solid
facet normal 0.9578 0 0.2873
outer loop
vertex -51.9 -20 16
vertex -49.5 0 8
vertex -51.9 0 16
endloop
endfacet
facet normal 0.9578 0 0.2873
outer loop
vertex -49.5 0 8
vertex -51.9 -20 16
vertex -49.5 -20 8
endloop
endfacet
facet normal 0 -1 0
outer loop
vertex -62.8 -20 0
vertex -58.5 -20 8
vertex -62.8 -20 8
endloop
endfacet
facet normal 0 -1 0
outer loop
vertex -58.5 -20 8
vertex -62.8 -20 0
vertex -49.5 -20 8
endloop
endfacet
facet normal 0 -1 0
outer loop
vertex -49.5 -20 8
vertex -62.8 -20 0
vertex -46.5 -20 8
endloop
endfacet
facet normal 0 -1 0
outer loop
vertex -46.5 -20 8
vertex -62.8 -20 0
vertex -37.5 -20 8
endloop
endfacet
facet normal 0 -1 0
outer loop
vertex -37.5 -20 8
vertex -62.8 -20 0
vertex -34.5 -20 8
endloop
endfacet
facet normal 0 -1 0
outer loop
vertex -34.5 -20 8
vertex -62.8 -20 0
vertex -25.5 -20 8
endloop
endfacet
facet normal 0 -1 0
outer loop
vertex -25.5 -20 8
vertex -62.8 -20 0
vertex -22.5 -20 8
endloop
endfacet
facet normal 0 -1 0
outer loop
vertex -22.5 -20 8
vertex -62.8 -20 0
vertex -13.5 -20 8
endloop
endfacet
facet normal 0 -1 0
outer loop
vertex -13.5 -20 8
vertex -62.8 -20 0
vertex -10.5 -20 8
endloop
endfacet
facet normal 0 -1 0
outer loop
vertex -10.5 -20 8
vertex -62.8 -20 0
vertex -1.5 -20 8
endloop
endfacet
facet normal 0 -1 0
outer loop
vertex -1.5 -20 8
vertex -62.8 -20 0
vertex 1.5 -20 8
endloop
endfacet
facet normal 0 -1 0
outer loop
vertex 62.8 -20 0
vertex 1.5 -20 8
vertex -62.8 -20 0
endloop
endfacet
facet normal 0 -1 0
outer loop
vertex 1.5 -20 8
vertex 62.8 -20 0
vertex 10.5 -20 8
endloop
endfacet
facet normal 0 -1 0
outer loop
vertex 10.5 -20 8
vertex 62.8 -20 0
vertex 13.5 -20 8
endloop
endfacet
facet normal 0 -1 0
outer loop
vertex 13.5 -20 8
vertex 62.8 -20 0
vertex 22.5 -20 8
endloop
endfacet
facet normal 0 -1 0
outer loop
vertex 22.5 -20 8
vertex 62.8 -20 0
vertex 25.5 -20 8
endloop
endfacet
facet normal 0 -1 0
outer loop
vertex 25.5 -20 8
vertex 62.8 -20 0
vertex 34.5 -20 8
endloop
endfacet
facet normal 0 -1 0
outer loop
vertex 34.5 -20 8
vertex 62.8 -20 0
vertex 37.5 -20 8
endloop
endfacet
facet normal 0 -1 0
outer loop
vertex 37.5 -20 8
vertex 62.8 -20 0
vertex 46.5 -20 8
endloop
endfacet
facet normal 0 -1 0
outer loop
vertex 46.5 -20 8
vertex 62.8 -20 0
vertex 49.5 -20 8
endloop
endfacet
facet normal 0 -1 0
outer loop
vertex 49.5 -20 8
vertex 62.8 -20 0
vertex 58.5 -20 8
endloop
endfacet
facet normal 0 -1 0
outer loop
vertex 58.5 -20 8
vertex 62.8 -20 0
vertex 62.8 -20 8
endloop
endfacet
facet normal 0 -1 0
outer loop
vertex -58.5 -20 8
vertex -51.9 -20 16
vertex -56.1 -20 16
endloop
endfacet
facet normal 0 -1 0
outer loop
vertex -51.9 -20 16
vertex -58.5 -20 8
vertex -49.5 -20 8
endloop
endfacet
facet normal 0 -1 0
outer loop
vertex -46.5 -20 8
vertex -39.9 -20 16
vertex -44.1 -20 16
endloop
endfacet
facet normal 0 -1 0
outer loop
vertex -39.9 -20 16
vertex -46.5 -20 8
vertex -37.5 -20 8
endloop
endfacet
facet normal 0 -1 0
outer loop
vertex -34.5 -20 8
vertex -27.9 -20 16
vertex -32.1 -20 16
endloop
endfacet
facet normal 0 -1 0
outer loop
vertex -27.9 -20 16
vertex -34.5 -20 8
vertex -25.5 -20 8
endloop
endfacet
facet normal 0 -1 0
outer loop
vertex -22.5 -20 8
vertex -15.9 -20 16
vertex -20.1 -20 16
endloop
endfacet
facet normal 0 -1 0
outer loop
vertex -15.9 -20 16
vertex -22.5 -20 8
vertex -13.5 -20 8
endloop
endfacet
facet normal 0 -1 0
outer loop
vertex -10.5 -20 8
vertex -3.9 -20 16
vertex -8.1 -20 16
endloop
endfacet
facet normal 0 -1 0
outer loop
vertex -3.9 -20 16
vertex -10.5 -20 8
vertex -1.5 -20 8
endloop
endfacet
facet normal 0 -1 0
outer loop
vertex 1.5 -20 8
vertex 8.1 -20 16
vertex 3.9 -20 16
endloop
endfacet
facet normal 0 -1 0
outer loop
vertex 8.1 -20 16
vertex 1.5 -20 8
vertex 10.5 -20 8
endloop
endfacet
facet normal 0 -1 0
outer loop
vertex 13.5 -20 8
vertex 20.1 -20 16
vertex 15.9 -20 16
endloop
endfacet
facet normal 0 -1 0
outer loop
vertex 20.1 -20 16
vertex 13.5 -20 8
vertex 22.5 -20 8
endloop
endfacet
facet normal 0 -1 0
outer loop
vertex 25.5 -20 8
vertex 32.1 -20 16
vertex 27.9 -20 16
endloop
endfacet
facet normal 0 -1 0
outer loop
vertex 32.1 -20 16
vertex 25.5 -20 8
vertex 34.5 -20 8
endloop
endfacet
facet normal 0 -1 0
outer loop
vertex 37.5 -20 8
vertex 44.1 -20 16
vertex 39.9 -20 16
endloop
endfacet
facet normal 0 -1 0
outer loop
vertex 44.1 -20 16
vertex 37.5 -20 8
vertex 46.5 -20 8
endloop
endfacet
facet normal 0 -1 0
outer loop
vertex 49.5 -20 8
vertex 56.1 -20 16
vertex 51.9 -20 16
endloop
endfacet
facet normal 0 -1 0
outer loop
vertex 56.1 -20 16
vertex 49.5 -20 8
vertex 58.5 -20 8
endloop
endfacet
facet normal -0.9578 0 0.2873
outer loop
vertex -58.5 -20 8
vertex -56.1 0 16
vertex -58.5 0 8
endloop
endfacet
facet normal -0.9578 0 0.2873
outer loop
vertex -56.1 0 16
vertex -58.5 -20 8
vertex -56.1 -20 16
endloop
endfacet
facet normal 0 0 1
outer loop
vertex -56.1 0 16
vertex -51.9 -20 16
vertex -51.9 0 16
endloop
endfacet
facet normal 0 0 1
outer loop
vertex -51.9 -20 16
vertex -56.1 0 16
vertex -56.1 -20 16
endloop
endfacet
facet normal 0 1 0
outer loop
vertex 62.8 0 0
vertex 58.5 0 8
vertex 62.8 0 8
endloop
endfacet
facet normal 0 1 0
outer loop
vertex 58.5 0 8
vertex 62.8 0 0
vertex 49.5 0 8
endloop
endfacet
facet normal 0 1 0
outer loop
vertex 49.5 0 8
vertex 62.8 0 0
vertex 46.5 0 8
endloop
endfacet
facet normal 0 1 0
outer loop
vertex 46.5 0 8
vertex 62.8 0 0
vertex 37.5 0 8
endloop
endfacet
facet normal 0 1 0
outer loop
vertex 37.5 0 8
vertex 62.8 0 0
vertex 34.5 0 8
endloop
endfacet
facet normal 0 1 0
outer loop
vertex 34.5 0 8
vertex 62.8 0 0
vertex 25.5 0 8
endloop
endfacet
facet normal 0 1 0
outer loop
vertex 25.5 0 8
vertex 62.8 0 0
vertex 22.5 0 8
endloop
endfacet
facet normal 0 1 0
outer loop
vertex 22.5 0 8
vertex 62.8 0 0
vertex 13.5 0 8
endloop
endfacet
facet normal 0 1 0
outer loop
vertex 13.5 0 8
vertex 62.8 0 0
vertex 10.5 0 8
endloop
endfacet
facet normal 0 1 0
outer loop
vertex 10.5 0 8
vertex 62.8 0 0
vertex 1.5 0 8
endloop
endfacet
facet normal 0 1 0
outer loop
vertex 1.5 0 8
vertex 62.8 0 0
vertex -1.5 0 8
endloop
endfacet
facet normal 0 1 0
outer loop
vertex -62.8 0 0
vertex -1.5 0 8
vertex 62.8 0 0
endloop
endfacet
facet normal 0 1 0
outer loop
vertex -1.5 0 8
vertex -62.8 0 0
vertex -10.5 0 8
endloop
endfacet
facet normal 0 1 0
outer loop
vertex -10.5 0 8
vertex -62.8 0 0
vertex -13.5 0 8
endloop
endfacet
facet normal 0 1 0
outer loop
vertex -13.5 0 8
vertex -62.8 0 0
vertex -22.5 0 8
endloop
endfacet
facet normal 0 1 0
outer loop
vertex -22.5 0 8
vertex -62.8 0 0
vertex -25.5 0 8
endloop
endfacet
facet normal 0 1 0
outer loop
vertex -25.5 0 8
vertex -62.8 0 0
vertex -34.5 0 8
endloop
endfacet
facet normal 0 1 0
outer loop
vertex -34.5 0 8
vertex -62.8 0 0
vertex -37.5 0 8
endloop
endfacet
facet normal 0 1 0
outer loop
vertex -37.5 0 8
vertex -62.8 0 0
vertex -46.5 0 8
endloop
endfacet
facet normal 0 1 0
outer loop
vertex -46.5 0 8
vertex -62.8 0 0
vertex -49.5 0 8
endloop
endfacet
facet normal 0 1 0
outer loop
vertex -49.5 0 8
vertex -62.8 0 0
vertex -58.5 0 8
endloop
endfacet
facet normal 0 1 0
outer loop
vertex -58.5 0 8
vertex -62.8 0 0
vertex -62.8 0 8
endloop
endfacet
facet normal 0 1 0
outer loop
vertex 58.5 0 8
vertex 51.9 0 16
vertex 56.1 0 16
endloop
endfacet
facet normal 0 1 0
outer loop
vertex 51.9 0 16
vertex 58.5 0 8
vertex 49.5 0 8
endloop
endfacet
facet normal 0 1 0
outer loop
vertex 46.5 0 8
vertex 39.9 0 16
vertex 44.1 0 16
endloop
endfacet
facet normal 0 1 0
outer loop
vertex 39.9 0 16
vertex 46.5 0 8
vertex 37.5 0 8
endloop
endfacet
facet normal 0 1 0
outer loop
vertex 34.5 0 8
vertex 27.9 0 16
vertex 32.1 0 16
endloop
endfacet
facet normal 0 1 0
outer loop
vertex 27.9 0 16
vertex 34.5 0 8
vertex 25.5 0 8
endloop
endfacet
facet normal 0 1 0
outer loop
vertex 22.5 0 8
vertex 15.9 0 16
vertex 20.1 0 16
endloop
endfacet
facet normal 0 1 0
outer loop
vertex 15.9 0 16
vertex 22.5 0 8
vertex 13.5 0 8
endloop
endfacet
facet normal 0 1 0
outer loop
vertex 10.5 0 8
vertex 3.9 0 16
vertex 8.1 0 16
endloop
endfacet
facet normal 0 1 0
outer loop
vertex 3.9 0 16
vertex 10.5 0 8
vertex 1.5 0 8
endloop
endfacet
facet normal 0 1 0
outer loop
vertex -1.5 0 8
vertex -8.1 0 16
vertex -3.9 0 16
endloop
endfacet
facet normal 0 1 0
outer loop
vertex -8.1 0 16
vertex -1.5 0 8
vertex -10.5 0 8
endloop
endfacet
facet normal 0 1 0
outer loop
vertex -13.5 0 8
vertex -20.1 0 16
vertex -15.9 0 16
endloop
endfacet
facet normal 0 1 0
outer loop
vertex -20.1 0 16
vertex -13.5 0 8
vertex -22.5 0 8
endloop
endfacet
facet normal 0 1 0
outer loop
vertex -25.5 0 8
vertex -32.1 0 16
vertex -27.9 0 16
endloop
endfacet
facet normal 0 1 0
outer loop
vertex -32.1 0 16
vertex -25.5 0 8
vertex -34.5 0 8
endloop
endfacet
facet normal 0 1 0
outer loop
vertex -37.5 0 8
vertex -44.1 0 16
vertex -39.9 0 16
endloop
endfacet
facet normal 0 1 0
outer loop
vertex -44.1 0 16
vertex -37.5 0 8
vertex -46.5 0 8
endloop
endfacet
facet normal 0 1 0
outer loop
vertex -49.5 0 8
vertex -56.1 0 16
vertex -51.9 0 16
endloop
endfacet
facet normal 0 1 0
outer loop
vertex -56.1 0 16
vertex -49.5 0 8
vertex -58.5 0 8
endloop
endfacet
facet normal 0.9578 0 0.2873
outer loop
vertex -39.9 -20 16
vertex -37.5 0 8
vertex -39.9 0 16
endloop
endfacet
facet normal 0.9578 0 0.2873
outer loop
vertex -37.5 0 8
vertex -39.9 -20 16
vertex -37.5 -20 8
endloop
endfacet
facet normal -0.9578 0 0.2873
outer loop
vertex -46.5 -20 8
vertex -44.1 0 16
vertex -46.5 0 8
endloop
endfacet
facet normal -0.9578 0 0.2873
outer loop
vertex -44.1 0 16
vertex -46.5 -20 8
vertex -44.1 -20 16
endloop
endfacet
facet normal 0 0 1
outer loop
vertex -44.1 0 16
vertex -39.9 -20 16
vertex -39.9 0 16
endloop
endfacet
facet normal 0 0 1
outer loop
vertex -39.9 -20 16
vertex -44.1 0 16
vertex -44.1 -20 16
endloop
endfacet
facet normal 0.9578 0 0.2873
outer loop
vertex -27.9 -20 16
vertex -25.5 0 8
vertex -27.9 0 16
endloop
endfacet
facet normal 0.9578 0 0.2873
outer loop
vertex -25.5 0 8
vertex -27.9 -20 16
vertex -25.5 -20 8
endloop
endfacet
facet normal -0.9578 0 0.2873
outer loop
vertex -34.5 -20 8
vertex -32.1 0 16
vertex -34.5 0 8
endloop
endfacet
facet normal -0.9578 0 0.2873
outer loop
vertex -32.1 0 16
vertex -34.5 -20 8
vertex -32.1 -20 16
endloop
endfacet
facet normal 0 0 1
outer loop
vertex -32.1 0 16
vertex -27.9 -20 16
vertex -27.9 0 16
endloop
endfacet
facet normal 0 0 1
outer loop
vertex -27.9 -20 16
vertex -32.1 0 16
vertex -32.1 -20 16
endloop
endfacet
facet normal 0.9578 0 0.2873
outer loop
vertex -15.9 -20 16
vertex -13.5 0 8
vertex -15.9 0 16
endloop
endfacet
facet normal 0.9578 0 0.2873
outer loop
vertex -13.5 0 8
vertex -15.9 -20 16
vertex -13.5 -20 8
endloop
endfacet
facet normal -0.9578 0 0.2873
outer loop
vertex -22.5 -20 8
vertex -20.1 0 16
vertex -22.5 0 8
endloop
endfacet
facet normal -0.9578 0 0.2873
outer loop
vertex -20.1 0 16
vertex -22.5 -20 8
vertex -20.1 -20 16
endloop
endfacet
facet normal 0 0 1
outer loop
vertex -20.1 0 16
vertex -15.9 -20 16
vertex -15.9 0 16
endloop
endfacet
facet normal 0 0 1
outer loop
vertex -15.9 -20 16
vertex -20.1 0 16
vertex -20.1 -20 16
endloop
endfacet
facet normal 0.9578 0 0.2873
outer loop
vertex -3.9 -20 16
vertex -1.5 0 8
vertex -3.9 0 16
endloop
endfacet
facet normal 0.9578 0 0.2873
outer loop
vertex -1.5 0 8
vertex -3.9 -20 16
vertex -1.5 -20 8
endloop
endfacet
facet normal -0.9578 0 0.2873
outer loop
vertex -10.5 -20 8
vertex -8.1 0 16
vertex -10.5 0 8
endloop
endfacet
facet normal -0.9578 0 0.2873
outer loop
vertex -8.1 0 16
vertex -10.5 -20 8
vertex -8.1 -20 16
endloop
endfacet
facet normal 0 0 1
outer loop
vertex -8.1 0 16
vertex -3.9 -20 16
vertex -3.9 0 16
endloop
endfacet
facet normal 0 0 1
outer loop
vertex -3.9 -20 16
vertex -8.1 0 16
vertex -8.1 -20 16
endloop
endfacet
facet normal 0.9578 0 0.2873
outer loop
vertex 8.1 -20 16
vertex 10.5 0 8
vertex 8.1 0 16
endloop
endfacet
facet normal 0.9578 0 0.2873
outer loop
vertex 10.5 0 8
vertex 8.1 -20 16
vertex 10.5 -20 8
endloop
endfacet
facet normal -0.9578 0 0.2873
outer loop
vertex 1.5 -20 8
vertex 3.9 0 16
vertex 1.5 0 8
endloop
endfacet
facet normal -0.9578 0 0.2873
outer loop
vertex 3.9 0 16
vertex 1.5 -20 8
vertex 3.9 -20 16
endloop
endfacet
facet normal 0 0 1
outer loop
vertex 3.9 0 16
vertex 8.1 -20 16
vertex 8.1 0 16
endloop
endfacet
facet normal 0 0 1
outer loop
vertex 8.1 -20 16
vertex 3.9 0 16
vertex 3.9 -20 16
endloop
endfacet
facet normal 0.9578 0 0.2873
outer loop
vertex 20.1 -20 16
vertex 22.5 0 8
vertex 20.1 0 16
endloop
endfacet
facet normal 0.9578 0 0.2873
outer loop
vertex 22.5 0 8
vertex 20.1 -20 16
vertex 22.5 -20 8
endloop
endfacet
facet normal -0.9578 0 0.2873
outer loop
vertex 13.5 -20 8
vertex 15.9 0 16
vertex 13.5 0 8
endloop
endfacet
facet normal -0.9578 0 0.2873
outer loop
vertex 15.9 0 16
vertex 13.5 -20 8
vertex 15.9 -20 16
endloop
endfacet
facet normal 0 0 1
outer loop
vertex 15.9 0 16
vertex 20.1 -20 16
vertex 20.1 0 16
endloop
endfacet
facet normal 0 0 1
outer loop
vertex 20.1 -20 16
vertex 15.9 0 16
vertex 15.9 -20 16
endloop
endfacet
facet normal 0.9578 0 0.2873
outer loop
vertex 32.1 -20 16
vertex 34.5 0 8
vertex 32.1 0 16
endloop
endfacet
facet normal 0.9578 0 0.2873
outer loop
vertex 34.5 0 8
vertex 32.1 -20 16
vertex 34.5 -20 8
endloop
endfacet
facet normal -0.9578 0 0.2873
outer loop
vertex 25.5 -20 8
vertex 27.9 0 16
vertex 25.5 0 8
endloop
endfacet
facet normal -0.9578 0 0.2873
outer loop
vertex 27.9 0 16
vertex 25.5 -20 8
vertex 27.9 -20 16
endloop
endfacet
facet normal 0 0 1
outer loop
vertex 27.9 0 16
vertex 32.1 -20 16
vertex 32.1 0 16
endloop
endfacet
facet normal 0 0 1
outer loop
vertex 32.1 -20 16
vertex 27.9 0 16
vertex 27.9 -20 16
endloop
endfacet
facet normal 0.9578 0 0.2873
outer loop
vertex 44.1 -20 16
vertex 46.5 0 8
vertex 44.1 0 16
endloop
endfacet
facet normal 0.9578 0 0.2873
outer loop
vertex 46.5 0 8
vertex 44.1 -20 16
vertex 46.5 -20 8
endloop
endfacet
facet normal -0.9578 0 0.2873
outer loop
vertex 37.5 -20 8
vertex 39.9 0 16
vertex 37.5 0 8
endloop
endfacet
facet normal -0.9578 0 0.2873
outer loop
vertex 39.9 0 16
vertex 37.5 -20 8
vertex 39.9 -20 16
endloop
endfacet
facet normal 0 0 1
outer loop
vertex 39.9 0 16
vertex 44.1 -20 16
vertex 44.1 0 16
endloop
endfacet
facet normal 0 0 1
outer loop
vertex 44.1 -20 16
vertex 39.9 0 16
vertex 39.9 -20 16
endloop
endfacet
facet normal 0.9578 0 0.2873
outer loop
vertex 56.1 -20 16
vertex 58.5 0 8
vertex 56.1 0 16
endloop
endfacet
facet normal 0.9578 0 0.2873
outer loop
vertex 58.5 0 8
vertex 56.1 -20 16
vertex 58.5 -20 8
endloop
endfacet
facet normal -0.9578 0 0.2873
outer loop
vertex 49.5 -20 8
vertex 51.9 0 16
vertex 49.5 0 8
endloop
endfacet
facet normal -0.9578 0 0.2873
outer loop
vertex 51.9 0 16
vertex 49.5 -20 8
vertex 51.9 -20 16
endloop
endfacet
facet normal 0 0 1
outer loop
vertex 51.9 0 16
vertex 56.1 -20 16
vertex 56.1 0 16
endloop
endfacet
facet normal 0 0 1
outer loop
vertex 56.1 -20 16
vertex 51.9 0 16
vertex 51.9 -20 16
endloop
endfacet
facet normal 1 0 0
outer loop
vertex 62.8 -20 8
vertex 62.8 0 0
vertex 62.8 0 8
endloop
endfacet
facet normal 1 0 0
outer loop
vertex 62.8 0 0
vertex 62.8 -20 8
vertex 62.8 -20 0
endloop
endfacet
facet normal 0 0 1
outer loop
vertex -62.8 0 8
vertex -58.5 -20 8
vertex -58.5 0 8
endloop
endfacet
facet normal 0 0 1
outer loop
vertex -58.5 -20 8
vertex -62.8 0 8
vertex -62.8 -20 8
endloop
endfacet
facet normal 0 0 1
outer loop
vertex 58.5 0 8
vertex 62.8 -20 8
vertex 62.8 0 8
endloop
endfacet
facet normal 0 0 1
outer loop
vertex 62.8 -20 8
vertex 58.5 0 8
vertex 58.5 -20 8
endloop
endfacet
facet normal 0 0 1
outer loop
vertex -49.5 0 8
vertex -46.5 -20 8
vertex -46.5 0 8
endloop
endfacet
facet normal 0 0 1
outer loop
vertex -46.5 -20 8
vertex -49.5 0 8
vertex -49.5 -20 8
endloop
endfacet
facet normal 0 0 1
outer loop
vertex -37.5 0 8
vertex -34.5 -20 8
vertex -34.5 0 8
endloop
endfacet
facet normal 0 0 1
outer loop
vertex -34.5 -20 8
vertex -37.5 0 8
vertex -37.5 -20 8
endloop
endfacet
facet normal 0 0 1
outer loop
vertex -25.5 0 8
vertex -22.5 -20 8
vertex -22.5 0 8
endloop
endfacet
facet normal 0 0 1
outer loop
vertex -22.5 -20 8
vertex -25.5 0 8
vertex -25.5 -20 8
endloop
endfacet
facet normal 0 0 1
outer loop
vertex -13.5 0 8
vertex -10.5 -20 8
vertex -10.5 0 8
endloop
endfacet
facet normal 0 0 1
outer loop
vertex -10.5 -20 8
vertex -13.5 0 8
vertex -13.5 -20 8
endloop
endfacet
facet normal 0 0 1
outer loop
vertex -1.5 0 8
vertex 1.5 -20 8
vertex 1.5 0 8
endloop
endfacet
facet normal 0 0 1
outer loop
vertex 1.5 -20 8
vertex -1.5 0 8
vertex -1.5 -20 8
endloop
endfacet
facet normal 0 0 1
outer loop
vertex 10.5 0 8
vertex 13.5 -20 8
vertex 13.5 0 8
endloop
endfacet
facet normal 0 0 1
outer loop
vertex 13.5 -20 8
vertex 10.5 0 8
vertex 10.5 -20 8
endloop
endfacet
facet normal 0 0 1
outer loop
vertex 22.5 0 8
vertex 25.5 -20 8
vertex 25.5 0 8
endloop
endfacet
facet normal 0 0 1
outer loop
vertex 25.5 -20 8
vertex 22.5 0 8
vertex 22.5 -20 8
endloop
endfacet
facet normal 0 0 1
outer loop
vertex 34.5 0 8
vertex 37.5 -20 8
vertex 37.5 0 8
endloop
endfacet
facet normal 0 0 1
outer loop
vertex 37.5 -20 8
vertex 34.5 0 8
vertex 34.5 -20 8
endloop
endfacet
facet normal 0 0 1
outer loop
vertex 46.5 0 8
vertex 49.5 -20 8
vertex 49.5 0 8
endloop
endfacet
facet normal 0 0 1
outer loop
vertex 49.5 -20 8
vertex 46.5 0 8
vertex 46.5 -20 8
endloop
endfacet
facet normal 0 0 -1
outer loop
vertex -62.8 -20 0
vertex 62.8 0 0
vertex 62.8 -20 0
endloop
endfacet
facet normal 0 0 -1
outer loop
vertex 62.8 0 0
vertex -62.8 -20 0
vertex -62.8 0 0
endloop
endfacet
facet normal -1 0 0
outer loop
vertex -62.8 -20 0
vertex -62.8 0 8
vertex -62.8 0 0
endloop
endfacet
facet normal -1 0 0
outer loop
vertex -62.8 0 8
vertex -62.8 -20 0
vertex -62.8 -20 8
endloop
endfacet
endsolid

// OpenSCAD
$fn = 32;

// ----------------------------------------------------------------------
// Toothed rack, 10 teeth
// 12 mm pitch, 8 mm teeth
// ----------------------------------------------------------------------

// --- parameters (mm) ---
bar_w = 20;       // bar width (Y)
seat_tol = 0.15;  // tolerance at the seating features
free_tol = 0.5;   // general tolerance on the free sizes
bar_h = 8;        // bar height (Z)
teeth = 10;       // number of teeth
pitch = 12;       // tooth pitch
tooth_h = 8;      // tooth height above the bar
root_w = 9.6;     // tooth width at the root
crest_w = 4.2;    // tooth width at the crest

// --- derived feature positions (mm) ---
span = (teeth - 1) * pitch;  // = 108   distance between the outer teeth
bar_l = span + root_w + 8;   // = 125.6   bar length: teeth plus 4 mm at each end
tooth_x = -span / 2;         // = -54   X of the first tooth
height = bar_h + tooth_h;    // = 16   overall height
feature_centers = [
  [tooth_x + 0 * pitch, -bar_w / 2],
  [tooth_x + 1 * pitch, -bar_w / 2],
  [tooth_x + 2 * pitch, -bar_w / 2],
  [tooth_x + 3 * pitch, -bar_w / 2],
  [tooth_x + 4 * pitch, -bar_w / 2],
  [tooth_x + 5 * pitch, -bar_w / 2],
  [tooth_x + 6 * pitch, -bar_w / 2],
  [tooth_x + 7 * pitch, -bar_w / 2],
  [tooth_x + 8 * pitch, -bar_w / 2],
  [tooth_x + 9 * pitch, -bar_w / 2]
];   // tooth centre line, drives the tooth loop

// bar with a rack of teeth, one extruded trapezoium per centre
module rack_tooth() {
  linear_extrude(height = bar_w)
    polygon(points = [
      [0, 0],
      [root_w, 0],
      [root_w / 2 + crest_w / 2, tooth_h + 1],
      [root_w / 2 - crest_w / 2, tooth_h + 1]
    ]);
}

union() {
  translate([-bar_l / 2, -bar_w, 0]) cube([bar_l, bar_w, bar_h]);
  for (centre = feature_centers)
    translate([centre[0] - root_w / 2, 0, bar_h - 1]) rotate([90, 0, 0]) rack_tooth();
}
